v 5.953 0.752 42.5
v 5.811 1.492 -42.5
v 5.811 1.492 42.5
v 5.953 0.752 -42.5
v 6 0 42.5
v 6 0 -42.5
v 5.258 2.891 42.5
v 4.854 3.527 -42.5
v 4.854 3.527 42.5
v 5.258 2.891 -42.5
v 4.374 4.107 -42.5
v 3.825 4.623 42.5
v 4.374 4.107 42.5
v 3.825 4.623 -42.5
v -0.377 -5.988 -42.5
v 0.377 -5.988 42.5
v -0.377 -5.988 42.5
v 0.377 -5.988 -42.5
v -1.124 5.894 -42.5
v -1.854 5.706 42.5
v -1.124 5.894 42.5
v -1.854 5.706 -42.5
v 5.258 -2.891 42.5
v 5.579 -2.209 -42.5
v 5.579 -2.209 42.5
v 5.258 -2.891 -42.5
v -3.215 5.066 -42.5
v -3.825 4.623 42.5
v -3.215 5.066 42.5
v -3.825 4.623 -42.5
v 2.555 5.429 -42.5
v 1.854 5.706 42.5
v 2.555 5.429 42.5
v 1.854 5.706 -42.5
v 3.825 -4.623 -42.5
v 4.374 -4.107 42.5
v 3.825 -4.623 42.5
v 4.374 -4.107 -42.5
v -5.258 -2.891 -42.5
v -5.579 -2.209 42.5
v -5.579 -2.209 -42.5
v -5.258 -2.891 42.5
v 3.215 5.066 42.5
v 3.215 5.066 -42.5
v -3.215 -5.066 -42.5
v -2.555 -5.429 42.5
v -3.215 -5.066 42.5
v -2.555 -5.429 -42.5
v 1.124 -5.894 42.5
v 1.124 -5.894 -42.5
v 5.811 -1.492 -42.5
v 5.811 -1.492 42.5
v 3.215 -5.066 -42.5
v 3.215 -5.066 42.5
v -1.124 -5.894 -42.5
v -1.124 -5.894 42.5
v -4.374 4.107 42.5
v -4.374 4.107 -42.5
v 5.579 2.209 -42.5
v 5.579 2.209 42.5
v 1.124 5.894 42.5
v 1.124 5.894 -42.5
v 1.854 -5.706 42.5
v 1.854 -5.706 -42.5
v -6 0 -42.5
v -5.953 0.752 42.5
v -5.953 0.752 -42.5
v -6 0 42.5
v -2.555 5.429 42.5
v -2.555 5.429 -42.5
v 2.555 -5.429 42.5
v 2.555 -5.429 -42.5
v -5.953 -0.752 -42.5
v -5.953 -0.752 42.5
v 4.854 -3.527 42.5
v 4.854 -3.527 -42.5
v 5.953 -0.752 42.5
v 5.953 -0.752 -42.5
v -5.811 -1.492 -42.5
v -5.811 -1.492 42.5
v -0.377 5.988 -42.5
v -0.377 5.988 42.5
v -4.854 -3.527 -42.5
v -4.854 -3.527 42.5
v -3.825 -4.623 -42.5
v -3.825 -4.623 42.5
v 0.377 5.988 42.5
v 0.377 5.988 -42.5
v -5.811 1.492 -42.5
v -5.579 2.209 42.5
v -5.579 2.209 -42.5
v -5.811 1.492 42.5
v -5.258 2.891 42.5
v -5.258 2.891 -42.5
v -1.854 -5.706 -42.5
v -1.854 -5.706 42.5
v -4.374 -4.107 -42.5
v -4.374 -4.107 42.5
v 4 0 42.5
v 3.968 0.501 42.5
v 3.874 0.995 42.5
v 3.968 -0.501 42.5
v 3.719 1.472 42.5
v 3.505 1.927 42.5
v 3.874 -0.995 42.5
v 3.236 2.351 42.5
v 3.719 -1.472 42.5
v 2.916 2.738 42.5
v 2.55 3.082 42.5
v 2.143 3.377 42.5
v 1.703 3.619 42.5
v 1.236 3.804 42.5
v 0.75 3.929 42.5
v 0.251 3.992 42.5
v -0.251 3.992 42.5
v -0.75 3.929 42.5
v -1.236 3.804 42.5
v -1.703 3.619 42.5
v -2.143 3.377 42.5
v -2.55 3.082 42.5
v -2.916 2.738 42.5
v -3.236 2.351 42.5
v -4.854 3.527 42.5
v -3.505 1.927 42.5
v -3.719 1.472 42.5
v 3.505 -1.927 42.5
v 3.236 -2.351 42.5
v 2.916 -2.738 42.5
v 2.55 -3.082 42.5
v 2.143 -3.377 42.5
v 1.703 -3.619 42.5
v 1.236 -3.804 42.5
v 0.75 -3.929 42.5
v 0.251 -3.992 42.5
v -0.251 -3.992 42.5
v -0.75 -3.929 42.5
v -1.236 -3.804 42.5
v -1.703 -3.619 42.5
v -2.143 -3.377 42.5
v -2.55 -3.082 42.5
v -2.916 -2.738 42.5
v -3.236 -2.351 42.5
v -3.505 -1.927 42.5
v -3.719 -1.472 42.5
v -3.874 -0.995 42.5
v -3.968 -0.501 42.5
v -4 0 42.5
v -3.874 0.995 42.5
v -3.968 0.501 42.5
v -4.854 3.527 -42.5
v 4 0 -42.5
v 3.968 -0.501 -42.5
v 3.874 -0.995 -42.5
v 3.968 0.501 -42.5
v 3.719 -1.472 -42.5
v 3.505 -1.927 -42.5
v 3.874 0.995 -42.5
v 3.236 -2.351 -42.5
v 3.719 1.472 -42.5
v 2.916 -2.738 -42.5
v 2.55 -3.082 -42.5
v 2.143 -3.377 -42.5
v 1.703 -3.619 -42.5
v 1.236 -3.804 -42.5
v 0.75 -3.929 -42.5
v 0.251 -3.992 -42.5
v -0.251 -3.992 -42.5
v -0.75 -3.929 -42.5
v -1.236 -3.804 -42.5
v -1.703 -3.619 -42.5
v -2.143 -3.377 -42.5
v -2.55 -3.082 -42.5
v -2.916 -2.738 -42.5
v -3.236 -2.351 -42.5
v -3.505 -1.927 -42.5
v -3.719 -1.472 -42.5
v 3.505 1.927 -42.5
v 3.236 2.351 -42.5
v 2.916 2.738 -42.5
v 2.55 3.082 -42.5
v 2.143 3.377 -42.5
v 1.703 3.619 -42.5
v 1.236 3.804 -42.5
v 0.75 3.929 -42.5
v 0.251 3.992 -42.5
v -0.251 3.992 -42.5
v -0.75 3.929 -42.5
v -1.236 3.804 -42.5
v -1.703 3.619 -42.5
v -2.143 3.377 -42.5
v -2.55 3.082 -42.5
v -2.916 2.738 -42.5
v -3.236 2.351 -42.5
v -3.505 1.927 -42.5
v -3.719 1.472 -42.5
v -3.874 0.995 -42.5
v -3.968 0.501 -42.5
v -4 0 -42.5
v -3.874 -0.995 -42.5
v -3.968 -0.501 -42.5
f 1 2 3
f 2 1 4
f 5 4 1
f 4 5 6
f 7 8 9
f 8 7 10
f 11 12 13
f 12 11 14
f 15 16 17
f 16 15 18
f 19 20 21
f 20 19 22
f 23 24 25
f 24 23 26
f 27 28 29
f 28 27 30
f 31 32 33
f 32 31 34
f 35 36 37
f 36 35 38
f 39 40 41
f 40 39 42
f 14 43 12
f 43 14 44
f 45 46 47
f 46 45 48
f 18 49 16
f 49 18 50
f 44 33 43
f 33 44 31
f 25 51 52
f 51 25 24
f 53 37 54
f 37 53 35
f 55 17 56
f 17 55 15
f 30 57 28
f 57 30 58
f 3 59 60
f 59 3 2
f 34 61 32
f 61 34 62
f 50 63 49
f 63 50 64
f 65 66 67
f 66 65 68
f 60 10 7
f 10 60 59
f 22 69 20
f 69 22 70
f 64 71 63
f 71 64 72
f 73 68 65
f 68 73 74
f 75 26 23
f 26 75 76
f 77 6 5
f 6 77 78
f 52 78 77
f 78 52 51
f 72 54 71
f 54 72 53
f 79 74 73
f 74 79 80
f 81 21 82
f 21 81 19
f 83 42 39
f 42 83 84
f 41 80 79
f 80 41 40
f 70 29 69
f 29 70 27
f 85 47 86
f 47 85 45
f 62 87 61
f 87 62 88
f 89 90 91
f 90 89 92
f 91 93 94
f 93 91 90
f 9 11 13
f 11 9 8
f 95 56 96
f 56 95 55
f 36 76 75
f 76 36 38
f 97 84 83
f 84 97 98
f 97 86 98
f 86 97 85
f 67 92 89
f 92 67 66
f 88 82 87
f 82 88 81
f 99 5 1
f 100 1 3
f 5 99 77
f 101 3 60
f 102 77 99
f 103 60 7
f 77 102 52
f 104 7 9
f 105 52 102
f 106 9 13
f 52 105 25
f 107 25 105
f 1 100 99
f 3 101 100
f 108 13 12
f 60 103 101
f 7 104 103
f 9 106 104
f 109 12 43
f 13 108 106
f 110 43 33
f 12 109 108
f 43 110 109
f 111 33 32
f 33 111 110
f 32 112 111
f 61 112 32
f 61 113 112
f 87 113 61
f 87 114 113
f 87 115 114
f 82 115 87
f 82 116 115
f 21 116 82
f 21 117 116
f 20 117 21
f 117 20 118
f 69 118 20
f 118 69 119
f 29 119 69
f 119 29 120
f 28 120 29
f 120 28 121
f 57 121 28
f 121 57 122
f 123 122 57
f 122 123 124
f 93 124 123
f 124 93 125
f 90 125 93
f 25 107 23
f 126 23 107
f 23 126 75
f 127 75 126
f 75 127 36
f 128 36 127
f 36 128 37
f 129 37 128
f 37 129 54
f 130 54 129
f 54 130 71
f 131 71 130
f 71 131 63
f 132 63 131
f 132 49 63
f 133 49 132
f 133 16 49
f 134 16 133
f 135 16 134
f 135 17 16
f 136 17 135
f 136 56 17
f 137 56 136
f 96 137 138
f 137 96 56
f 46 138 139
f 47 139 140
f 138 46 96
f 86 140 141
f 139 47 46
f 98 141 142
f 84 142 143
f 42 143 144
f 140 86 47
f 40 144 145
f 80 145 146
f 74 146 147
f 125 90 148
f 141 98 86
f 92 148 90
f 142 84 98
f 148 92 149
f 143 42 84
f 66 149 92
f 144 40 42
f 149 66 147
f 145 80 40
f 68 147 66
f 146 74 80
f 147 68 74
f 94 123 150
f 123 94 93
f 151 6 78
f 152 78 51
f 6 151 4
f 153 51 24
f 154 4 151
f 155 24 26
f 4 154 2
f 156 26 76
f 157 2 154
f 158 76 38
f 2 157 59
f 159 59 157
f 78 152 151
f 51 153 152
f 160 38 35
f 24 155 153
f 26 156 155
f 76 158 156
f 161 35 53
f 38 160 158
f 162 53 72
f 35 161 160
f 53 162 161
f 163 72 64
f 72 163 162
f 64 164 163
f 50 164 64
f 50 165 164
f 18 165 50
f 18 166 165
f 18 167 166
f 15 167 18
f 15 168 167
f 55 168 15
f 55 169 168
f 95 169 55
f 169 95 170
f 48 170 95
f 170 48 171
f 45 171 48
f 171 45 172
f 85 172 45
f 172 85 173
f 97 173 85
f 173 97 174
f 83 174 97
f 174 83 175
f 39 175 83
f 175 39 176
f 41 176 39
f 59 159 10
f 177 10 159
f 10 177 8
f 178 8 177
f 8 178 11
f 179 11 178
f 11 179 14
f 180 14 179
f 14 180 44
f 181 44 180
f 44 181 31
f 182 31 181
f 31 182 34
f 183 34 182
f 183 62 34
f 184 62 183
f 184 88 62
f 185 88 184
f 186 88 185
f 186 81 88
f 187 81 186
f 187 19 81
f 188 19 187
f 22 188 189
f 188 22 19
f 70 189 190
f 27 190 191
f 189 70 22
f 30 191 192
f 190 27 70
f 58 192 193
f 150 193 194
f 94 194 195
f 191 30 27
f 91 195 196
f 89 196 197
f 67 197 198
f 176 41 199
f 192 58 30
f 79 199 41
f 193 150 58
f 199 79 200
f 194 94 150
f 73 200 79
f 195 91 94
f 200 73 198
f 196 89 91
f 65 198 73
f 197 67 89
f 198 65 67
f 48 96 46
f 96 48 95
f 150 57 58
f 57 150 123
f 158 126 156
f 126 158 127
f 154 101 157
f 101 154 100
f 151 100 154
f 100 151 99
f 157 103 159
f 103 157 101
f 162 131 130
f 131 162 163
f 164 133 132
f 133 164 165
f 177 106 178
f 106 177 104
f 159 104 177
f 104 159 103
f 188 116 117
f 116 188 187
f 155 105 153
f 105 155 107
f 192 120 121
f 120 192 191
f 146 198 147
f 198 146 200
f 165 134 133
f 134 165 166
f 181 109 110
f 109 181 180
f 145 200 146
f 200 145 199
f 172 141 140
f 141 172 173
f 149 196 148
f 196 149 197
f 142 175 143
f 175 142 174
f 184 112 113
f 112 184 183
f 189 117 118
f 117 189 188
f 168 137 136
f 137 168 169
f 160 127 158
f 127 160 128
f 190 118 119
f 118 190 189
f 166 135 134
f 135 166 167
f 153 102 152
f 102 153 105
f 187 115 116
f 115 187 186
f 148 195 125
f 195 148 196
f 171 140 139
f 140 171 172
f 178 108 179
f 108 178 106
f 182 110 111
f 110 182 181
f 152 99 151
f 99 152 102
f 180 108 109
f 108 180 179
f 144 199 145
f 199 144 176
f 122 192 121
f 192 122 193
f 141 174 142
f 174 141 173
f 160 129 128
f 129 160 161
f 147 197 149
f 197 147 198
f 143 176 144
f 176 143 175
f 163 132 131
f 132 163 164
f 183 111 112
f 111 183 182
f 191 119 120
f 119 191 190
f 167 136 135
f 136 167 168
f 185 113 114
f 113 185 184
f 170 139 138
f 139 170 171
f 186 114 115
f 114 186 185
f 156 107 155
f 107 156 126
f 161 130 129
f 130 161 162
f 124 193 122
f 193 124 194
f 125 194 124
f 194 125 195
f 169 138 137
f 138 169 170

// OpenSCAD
$fn = 50;


difference() {
	union() {
		translate(v = [0, 0, -42.5000000000]) {
			cylinder(h = 85, r = 6.0000000000);
		}
	}
	union() {
		translate(v = [0, 0, -100.0000000000]) {
			cylinder(h = 200, r = 4.0000000000);
		}
	}
}
